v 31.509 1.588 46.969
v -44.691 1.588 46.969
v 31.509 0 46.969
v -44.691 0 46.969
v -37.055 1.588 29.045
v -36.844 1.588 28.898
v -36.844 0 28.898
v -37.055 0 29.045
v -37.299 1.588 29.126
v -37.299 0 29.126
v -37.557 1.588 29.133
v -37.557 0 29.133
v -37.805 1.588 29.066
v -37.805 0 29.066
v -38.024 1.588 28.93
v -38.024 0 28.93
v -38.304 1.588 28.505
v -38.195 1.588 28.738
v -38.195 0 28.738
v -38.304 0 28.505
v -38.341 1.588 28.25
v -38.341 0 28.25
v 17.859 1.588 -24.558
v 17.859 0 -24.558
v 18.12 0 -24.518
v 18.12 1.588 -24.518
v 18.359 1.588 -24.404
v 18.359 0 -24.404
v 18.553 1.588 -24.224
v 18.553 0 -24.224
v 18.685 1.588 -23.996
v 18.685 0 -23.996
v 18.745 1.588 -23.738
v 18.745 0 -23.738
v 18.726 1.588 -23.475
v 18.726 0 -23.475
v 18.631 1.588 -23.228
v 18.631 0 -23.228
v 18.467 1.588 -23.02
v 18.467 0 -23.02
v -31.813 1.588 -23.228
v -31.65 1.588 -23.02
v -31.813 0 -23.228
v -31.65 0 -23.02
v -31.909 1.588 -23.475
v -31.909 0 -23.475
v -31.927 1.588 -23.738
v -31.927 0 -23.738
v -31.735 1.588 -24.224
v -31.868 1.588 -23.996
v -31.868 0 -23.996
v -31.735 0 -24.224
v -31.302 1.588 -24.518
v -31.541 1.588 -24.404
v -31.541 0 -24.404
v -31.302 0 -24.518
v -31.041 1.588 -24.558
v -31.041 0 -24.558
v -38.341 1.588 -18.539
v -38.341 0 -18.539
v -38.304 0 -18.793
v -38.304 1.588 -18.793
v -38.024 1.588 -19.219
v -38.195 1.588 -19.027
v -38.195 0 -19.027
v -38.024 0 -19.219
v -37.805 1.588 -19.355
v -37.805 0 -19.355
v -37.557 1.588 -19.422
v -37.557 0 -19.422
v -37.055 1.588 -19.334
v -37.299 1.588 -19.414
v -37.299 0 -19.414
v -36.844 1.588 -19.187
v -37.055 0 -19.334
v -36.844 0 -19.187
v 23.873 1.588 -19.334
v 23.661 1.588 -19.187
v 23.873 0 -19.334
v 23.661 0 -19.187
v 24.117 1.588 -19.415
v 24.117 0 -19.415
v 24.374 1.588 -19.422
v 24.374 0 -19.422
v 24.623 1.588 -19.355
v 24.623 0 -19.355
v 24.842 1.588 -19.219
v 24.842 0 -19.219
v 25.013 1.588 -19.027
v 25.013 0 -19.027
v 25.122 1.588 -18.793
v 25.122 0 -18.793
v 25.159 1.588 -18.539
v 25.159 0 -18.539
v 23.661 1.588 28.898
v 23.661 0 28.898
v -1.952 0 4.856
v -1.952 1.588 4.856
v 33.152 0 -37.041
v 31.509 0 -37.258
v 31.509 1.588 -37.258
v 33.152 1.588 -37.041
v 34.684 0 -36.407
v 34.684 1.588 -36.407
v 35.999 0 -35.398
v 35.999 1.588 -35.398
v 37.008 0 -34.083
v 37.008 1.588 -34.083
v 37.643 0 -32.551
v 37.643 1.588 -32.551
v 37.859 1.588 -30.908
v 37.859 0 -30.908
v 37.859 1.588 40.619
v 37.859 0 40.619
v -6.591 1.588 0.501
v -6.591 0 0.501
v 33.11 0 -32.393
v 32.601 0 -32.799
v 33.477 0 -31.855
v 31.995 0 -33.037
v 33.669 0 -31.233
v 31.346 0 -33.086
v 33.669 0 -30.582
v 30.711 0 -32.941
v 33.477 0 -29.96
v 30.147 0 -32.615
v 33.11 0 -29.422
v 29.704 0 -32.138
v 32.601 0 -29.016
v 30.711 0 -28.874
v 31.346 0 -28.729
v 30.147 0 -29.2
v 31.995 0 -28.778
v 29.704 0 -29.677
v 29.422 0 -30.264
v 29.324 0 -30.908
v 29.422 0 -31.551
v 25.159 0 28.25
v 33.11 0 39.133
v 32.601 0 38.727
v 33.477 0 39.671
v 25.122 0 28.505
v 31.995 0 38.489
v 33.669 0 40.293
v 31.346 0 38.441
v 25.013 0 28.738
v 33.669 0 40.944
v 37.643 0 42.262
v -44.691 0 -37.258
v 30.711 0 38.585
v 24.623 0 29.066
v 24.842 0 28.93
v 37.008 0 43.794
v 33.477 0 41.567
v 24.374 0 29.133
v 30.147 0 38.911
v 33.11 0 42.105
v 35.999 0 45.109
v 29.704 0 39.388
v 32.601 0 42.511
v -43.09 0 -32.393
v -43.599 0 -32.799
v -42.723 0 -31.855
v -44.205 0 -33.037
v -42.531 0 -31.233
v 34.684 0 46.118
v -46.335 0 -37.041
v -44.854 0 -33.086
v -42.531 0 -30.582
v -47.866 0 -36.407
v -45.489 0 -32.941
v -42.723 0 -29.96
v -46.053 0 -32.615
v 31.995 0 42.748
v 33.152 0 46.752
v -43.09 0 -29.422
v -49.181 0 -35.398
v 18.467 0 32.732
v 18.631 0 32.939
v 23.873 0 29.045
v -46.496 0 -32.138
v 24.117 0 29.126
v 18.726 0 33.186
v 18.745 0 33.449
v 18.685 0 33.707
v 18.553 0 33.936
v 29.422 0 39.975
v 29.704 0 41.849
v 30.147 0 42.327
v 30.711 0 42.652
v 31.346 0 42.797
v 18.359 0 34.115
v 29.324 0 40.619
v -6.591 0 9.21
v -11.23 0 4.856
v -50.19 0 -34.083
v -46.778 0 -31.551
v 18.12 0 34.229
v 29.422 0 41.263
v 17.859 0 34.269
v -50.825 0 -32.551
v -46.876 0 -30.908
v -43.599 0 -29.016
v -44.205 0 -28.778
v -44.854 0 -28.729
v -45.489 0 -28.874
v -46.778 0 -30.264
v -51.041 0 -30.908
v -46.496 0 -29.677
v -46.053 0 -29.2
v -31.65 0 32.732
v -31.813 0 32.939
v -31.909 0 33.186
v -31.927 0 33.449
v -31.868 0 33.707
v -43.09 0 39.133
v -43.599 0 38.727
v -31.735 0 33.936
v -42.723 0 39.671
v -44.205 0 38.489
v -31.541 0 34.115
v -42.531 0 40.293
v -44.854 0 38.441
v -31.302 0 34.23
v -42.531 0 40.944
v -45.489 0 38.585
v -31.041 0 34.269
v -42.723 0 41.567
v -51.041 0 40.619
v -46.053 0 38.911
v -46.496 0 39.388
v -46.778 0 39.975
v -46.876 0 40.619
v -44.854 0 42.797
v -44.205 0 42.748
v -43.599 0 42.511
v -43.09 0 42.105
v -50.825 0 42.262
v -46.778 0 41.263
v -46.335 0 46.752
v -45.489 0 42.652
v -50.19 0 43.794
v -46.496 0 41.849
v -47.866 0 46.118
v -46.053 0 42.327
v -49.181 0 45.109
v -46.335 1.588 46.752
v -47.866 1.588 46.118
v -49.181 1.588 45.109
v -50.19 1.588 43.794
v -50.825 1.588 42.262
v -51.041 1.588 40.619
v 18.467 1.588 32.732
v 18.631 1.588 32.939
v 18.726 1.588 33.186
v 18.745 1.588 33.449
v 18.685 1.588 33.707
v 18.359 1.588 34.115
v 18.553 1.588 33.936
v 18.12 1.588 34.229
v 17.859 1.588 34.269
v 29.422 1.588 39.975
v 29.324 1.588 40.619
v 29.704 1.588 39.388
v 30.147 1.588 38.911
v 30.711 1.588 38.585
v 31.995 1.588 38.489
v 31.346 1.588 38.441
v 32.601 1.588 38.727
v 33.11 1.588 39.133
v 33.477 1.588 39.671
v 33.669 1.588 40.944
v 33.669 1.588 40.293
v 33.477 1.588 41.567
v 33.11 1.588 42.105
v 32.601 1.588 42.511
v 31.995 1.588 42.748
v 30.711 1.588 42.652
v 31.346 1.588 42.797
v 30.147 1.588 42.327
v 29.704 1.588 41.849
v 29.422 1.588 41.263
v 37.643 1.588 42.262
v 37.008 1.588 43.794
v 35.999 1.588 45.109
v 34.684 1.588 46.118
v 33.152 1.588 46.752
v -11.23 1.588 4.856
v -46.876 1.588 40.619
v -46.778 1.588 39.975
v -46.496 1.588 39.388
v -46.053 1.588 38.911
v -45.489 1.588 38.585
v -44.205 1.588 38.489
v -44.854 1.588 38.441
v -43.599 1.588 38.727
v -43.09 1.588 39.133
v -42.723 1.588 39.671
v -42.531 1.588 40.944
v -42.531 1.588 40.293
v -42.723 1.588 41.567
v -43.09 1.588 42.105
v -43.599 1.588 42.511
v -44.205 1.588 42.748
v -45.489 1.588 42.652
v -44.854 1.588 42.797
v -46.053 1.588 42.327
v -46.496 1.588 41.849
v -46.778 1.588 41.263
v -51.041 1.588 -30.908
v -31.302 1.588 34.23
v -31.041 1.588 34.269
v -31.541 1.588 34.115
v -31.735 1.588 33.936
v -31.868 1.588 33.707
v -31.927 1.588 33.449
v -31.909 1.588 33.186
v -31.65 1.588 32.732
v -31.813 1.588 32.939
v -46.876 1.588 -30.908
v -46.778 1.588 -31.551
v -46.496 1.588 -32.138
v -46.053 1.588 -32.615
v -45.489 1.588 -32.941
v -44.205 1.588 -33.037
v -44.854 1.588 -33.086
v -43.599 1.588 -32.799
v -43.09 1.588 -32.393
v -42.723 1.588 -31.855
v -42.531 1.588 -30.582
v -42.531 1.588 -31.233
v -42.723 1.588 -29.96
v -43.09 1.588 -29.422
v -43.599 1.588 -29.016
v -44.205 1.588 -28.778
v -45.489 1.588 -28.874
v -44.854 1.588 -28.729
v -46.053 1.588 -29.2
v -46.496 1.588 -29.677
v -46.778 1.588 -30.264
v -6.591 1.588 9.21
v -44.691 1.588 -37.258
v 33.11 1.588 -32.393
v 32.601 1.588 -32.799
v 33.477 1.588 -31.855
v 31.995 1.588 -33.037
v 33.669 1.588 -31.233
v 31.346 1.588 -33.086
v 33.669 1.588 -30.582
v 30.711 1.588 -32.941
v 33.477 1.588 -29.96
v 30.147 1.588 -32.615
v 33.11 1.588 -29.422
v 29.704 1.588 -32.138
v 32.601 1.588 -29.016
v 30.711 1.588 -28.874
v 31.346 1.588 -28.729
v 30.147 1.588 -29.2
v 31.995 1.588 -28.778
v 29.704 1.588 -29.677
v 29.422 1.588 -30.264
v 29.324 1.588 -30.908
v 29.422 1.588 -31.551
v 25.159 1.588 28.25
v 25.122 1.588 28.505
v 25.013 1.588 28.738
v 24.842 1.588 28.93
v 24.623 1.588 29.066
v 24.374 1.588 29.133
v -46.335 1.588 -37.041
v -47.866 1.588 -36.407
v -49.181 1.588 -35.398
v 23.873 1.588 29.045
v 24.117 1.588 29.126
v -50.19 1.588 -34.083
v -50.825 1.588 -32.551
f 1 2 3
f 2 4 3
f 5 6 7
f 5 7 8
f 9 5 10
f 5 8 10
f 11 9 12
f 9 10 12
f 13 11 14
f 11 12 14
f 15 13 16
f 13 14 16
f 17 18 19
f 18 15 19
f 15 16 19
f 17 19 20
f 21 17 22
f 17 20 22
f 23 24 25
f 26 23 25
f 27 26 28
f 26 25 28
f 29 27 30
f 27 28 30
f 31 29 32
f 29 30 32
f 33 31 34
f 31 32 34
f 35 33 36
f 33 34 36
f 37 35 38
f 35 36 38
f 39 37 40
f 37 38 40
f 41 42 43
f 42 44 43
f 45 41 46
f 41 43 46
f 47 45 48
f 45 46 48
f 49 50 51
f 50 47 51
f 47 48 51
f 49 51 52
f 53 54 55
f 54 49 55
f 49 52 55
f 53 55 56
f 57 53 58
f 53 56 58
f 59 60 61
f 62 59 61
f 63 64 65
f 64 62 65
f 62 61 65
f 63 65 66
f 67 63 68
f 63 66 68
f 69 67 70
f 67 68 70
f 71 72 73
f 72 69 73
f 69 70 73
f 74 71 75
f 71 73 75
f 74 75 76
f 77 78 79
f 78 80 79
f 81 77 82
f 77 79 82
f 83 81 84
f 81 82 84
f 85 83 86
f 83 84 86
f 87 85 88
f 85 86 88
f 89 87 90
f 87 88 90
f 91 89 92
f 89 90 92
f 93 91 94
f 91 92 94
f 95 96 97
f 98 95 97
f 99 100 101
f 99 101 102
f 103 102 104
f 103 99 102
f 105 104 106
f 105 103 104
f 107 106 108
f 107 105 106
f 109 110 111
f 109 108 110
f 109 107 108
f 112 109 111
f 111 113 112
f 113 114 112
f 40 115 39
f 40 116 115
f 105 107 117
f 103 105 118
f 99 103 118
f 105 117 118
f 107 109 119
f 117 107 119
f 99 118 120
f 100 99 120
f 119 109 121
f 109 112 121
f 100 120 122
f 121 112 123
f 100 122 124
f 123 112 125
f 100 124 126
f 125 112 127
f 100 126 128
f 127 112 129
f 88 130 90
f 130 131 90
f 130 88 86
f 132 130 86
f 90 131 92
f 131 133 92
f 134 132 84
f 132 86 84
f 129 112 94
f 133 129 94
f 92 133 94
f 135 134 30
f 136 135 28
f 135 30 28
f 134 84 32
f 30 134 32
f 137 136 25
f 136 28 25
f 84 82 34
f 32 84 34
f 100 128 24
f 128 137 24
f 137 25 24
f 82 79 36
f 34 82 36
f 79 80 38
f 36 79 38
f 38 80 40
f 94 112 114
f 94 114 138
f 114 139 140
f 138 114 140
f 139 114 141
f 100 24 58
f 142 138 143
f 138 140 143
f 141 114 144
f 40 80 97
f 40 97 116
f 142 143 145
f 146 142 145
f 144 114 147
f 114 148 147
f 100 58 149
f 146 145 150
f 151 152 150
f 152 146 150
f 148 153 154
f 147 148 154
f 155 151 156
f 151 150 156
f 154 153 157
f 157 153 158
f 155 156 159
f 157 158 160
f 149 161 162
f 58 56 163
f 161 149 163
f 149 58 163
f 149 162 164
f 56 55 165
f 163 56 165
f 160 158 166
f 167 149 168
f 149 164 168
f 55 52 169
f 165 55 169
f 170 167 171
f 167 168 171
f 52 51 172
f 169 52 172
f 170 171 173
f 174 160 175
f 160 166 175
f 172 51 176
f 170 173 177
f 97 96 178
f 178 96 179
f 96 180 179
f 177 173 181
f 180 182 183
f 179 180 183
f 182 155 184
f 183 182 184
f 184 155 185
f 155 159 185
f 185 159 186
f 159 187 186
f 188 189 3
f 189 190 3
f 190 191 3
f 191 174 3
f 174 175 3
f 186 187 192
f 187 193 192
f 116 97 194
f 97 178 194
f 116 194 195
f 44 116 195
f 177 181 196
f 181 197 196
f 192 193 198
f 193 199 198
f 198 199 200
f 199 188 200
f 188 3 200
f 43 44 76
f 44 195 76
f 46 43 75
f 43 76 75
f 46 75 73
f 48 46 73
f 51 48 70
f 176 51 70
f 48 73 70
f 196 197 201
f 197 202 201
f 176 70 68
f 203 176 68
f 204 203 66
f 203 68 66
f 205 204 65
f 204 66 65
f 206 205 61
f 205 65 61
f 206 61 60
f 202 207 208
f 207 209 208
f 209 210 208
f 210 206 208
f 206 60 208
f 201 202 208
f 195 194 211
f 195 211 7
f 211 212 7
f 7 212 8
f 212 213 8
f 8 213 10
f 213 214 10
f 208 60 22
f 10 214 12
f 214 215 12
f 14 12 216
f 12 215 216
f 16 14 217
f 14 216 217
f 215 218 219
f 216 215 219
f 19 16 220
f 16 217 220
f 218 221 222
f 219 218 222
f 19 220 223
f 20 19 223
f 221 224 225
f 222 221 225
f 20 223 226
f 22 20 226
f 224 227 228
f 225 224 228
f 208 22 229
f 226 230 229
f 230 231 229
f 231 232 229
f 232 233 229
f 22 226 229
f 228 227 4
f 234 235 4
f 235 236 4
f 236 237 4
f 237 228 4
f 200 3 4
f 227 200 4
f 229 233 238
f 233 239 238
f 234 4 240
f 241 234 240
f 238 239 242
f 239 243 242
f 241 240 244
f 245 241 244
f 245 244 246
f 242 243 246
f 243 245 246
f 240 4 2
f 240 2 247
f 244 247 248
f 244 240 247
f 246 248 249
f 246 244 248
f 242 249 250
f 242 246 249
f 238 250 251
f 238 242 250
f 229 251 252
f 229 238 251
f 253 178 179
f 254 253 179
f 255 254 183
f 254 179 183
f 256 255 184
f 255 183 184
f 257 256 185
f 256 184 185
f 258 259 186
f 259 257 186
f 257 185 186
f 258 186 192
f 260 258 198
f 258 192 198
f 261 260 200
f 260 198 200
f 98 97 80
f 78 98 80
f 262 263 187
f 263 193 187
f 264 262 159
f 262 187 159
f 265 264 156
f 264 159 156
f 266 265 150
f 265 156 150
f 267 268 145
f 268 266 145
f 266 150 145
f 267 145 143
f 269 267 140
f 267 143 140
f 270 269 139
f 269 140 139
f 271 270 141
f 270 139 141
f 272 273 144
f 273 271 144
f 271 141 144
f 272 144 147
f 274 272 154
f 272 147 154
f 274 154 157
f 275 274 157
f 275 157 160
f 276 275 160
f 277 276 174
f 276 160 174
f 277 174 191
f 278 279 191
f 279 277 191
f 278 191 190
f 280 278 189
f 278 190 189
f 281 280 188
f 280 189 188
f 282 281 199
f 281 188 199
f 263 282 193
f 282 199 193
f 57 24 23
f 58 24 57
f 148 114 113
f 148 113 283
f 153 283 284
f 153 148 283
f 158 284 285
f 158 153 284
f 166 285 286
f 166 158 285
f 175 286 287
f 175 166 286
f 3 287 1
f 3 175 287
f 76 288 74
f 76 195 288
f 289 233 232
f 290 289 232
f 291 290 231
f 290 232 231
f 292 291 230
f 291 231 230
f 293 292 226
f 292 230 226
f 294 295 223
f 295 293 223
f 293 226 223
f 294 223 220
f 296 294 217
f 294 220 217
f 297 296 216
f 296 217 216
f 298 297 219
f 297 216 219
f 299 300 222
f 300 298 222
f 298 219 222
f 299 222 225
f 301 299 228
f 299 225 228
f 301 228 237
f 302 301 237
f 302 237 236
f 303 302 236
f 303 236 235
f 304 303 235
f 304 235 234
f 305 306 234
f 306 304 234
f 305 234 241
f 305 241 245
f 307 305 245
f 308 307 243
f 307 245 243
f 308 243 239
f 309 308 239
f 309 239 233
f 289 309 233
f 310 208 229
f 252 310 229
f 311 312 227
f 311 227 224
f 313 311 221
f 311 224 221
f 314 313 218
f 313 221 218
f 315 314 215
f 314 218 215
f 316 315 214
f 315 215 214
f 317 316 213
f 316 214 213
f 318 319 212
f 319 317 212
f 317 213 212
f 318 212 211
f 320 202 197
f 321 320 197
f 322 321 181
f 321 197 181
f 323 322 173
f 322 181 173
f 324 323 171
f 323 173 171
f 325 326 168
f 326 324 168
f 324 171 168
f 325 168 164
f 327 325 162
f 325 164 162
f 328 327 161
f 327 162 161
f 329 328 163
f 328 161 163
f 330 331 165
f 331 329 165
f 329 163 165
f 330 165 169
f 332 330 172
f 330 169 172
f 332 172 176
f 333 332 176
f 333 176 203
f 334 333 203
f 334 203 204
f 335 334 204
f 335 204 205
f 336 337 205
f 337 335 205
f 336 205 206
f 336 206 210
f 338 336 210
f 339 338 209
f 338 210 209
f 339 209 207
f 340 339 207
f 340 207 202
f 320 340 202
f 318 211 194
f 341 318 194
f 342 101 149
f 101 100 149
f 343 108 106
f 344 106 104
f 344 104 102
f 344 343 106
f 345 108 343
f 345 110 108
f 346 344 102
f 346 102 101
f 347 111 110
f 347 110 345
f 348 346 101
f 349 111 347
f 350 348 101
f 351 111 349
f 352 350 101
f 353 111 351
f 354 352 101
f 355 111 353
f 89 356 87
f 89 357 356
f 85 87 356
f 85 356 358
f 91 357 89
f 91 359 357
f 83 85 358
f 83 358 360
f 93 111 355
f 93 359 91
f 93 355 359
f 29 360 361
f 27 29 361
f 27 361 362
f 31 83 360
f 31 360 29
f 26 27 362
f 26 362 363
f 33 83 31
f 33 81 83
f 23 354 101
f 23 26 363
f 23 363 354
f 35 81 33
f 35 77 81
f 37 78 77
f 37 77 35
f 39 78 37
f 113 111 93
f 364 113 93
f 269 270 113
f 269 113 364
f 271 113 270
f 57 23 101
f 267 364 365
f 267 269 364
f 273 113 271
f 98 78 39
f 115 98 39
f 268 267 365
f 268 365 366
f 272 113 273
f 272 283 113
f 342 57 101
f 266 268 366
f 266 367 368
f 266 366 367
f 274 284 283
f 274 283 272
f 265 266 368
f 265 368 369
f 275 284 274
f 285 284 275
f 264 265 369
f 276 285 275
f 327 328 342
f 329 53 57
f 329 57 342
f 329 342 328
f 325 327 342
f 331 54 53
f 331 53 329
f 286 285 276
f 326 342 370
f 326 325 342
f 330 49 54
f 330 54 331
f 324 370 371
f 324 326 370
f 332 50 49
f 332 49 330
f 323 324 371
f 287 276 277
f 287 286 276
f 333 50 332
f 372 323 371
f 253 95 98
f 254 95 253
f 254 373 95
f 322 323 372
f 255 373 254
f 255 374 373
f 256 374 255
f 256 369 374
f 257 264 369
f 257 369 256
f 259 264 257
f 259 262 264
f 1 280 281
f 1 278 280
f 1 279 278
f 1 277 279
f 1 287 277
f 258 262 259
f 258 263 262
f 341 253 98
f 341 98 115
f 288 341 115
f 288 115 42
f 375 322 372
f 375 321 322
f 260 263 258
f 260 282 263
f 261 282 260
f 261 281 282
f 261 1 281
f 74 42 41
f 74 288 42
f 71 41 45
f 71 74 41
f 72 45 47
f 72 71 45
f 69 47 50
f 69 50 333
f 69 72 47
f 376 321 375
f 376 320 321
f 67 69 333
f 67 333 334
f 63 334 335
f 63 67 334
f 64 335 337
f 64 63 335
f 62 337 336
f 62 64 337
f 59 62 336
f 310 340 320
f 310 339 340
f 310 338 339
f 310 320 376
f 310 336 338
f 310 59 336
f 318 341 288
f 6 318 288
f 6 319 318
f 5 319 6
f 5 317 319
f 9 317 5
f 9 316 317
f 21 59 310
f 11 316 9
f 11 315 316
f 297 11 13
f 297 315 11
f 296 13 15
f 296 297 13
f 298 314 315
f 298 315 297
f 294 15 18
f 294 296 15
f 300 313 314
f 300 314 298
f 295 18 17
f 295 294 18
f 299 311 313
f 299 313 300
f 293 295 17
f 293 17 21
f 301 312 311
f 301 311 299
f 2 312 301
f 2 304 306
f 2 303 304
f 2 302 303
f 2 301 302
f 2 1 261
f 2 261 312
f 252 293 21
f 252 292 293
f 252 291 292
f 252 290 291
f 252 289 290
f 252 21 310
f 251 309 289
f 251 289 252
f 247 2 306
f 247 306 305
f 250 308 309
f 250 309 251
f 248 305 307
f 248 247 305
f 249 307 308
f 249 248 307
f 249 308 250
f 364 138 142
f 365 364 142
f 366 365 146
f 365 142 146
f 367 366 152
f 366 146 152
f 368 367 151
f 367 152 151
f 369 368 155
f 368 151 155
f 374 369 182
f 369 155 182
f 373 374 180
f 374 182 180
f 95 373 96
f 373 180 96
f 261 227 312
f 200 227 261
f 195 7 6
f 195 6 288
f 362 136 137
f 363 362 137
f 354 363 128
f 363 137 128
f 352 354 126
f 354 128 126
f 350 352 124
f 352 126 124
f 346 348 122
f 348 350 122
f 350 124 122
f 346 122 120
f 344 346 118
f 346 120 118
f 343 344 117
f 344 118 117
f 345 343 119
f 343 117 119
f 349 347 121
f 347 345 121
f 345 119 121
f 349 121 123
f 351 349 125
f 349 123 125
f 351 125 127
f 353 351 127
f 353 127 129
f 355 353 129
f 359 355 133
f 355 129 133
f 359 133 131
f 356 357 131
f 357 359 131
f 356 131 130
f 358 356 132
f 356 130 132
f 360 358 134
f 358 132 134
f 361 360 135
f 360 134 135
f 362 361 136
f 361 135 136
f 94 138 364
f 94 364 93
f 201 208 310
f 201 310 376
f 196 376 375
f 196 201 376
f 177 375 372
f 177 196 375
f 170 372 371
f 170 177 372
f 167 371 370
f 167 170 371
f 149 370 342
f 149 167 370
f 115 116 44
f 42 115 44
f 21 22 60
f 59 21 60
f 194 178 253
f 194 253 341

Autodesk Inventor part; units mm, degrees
ref_plane "YZ Plane" through (0, 0, 0) normal (1, 0, 0) x (0, 1, 0)
ref_plane "XZ Plane" through (0, 0, 0) normal (0, 1, 0) x (-1, 0, 0)
ref_plane "XY Plane" through (0, 0, 0) normal (0, 0, 1) x (1, 0, 0)
sketch "Sketch1" plane through (0, 0, 0) normal (0, 1, 0) x (-1, 0, 0)
  circle A0 centre (-31.5089, -30.9076) radius 2.1844
  circle A1 centre (-31.5089, 40.6188) radius 2.1844
  circle A2 centre (44.6911, -30.9076) radius 2.1844
  circle A3 centre (44.6911, 40.6188) radius 2.1844
  circle A4 centre (44.6911, 40.6188) radius 6.35
  circle A5 centre (44.6911, -30.9076) radius 6.35
  circle A6 centre (-31.5089, -30.9076) radius 6.35
  circle A7 centre (-31.5089, 40.6188) radius 6.35
  line L0 (44.6911, 46.9688) -> (-31.5089, 46.9688)
  line L1 (-37.8589, 40.6188) -> (-37.8589, -30.9076)
  line L2 (-31.5089, -37.2576) -> (44.6911, -37.2576)
  line L3 (51.0411, -30.9076) -> (51.0411, 40.6188)
  line L4 (44.6911, 34.2688) -> (-31.5089, 34.2688)
  line L5 (-25.1589, 40.6188) -> (-25.1589, -30.9076)
  line L6 (-31.5089, -24.5576) -> (44.6911, -24.5576)
  line L7 (38.3411, 40.6188) -> (38.3411, -30.9076)
  line L8 (38.3411, 35.5878) -> (38.3411, 29.2378)
  line L9 (-25.1589, -24.5576) -> (-25.1589, -18.2076)
  line L10 (-25.1589, 34.2688) -> (-25.1589, 27.9188)
  line L11 (38.3411, -24.5576) -> (38.3411, -21.3826)
  line L12 (38.3411, -24.5576) -> (35.1661, -24.5576)
  line L13 (38.3411, 34.2688) -> (38.3411, 27.9188)
  line L14 (38.3411, -24.5576) -> (31.9911, -24.5576)
  circle A8 centre (-31.5089, 40.6188) radius 3.175
  circle A9 centre (44.6911, 40.6188) radius 3.175
  circle A10 centre (44.6911, -30.9076) radius 3.175
  circle A11 centre (-31.5089, -30.9076) radius 3.175
  line L15 (42.5182, 42.9337) -> (-33.6818, -28.5927)
  line L16 (46.8641, 38.3039) -> (-29.3359, -33.2225)
  line L17 (-29.3359, 42.9337) -> (46.8641, -28.5927)
  line L18 (-33.6818, 38.3039) -> (42.5182, -33.2225)
  arc A12 (31.6495, 32.7316) -> (31.041, 34.2688) centre (31.041, 33.3798) ccw
  arc A13 (38.3411, 28.2499) -> (36.8437, 28.8981) centre (37.4521, 28.2499) ccw
  arc A14 (36.8437, -19.1869) -> (38.3411, -18.5387) centre (37.4521, -18.5387) ccw
  arc A15 (31.041, -24.5576) -> (31.6495, -23.0204) centre (31.041, -23.6686) ccw
  arc A16 (-17.8588, 34.2688) -> (-18.4672, 32.7316) centre (-17.8588, 33.3798) ccw
  arc A17 (-23.6614, 28.8981) -> (-25.1589, 28.2499) centre (-24.2699, 28.2499) ccw
  arc A18 (-25.1589, -18.5387) -> (-23.6614, -19.1869) centre (-24.2699, -18.5387) ccw
  arc A19 (-18.4672, -23.0204) -> (-17.8588, -24.5576) centre (-17.8588, -23.6686) ccw
  point P0 (-25.1589, 30.3037)
  point P1 (1.952, 4.8556)
  point P2 (-25.1589, -20.5925)
  point P3 (-20.1048, 34.2688)
  point P4 (33.2871, 34.2688)
  point P5 (6.5911, 9.2102)
  point P6 (6.5911, 0.501)
  point P7 (-20.1048, -24.5576)
  point P8 (11.2303, 4.8556)
  point P9 (-25.1589, 28.2499)
  point P10 (-25.1589, -18.5387)
  dimension "d0" = 12.7
  dimension "d1" = 12.7
  dimension "d2" = 12.7
  dimension "d3" = 12.7
  dimension "d8" = 6.35
  dimension "d11" = 6.35
  dimension "d14" = 6.35
  dimension "d16" = 6.35
  dimension "d17" = 6.35
  dimension "d18" = 6.35
  dimension "d19" = 6.35
  dimension "d20" = 6.35
  dimension "d21" = 0.889
  dimension "d22" = 0.889
  dimension "d23" = 0.889
  dimension "d24" = 0.889
  dimension "d25" = 0.889
  dimension "d26" = 0.889
  dimension "d27" = 0.889
  dimension "d28" = 0.889
extrude "Extrusion1" add sketch "Sketch1" along normal blind 1.5875 contours A4 L16 A9 L15 | L3 A5 L6 L17 L7 L16 L4 A4 | A4 L7 L15 L4 L17 L5 A7 L0 | L4 L16 A4 | A5 L18 A10 L17 | A4 L15 L7 | A7 L17 A8 L18 | L16 L4 L7 L15 A4 | A4 L15 A9 L16 | L16 L7 L4 | A5 L17 L6 | L2 A6 L5 L16 L6 L18 L7 A5 | L7 L4 L15 | L5 L17 A7 | A7 L4 L18 L5 L15 L6 A6 L1 | A9 | L7 L16 L17 L15 L4 | L7 A13 L16 | L17 A10 L18 A5 | A5 L18 L7 L6 L17 | L6 L7 L17 | L7 L18 A5 | A6 L15 A11 L16 | L15 A12 L4 | L17 L5 L4 L18 A7 | A7 L18 A8 L17 | L17 L4 L5 | A7 L18 L4 | A10 | L7 L18 L6 | L6 L18 L16 L17 L7 | L17 A14 L7 | A6 L16 L5 | A8 | L5 L18 L4 | L4 L17 L15 L18 L5 | L4 A16 L17 | L6 L15 A6 | L16 L18 L15 L17 | L6 A15 L18 | L16 A11 L15 A6 | A6 L15 L6 L5 L16 | L5 L6 L16 | L18 A17 L5 | L15 L5 L6 | L16 L6 L5 L15 L18 | A11 | L16 A19 L6 | L5 A18 L15
properties part number "Hookcrossbrace"
